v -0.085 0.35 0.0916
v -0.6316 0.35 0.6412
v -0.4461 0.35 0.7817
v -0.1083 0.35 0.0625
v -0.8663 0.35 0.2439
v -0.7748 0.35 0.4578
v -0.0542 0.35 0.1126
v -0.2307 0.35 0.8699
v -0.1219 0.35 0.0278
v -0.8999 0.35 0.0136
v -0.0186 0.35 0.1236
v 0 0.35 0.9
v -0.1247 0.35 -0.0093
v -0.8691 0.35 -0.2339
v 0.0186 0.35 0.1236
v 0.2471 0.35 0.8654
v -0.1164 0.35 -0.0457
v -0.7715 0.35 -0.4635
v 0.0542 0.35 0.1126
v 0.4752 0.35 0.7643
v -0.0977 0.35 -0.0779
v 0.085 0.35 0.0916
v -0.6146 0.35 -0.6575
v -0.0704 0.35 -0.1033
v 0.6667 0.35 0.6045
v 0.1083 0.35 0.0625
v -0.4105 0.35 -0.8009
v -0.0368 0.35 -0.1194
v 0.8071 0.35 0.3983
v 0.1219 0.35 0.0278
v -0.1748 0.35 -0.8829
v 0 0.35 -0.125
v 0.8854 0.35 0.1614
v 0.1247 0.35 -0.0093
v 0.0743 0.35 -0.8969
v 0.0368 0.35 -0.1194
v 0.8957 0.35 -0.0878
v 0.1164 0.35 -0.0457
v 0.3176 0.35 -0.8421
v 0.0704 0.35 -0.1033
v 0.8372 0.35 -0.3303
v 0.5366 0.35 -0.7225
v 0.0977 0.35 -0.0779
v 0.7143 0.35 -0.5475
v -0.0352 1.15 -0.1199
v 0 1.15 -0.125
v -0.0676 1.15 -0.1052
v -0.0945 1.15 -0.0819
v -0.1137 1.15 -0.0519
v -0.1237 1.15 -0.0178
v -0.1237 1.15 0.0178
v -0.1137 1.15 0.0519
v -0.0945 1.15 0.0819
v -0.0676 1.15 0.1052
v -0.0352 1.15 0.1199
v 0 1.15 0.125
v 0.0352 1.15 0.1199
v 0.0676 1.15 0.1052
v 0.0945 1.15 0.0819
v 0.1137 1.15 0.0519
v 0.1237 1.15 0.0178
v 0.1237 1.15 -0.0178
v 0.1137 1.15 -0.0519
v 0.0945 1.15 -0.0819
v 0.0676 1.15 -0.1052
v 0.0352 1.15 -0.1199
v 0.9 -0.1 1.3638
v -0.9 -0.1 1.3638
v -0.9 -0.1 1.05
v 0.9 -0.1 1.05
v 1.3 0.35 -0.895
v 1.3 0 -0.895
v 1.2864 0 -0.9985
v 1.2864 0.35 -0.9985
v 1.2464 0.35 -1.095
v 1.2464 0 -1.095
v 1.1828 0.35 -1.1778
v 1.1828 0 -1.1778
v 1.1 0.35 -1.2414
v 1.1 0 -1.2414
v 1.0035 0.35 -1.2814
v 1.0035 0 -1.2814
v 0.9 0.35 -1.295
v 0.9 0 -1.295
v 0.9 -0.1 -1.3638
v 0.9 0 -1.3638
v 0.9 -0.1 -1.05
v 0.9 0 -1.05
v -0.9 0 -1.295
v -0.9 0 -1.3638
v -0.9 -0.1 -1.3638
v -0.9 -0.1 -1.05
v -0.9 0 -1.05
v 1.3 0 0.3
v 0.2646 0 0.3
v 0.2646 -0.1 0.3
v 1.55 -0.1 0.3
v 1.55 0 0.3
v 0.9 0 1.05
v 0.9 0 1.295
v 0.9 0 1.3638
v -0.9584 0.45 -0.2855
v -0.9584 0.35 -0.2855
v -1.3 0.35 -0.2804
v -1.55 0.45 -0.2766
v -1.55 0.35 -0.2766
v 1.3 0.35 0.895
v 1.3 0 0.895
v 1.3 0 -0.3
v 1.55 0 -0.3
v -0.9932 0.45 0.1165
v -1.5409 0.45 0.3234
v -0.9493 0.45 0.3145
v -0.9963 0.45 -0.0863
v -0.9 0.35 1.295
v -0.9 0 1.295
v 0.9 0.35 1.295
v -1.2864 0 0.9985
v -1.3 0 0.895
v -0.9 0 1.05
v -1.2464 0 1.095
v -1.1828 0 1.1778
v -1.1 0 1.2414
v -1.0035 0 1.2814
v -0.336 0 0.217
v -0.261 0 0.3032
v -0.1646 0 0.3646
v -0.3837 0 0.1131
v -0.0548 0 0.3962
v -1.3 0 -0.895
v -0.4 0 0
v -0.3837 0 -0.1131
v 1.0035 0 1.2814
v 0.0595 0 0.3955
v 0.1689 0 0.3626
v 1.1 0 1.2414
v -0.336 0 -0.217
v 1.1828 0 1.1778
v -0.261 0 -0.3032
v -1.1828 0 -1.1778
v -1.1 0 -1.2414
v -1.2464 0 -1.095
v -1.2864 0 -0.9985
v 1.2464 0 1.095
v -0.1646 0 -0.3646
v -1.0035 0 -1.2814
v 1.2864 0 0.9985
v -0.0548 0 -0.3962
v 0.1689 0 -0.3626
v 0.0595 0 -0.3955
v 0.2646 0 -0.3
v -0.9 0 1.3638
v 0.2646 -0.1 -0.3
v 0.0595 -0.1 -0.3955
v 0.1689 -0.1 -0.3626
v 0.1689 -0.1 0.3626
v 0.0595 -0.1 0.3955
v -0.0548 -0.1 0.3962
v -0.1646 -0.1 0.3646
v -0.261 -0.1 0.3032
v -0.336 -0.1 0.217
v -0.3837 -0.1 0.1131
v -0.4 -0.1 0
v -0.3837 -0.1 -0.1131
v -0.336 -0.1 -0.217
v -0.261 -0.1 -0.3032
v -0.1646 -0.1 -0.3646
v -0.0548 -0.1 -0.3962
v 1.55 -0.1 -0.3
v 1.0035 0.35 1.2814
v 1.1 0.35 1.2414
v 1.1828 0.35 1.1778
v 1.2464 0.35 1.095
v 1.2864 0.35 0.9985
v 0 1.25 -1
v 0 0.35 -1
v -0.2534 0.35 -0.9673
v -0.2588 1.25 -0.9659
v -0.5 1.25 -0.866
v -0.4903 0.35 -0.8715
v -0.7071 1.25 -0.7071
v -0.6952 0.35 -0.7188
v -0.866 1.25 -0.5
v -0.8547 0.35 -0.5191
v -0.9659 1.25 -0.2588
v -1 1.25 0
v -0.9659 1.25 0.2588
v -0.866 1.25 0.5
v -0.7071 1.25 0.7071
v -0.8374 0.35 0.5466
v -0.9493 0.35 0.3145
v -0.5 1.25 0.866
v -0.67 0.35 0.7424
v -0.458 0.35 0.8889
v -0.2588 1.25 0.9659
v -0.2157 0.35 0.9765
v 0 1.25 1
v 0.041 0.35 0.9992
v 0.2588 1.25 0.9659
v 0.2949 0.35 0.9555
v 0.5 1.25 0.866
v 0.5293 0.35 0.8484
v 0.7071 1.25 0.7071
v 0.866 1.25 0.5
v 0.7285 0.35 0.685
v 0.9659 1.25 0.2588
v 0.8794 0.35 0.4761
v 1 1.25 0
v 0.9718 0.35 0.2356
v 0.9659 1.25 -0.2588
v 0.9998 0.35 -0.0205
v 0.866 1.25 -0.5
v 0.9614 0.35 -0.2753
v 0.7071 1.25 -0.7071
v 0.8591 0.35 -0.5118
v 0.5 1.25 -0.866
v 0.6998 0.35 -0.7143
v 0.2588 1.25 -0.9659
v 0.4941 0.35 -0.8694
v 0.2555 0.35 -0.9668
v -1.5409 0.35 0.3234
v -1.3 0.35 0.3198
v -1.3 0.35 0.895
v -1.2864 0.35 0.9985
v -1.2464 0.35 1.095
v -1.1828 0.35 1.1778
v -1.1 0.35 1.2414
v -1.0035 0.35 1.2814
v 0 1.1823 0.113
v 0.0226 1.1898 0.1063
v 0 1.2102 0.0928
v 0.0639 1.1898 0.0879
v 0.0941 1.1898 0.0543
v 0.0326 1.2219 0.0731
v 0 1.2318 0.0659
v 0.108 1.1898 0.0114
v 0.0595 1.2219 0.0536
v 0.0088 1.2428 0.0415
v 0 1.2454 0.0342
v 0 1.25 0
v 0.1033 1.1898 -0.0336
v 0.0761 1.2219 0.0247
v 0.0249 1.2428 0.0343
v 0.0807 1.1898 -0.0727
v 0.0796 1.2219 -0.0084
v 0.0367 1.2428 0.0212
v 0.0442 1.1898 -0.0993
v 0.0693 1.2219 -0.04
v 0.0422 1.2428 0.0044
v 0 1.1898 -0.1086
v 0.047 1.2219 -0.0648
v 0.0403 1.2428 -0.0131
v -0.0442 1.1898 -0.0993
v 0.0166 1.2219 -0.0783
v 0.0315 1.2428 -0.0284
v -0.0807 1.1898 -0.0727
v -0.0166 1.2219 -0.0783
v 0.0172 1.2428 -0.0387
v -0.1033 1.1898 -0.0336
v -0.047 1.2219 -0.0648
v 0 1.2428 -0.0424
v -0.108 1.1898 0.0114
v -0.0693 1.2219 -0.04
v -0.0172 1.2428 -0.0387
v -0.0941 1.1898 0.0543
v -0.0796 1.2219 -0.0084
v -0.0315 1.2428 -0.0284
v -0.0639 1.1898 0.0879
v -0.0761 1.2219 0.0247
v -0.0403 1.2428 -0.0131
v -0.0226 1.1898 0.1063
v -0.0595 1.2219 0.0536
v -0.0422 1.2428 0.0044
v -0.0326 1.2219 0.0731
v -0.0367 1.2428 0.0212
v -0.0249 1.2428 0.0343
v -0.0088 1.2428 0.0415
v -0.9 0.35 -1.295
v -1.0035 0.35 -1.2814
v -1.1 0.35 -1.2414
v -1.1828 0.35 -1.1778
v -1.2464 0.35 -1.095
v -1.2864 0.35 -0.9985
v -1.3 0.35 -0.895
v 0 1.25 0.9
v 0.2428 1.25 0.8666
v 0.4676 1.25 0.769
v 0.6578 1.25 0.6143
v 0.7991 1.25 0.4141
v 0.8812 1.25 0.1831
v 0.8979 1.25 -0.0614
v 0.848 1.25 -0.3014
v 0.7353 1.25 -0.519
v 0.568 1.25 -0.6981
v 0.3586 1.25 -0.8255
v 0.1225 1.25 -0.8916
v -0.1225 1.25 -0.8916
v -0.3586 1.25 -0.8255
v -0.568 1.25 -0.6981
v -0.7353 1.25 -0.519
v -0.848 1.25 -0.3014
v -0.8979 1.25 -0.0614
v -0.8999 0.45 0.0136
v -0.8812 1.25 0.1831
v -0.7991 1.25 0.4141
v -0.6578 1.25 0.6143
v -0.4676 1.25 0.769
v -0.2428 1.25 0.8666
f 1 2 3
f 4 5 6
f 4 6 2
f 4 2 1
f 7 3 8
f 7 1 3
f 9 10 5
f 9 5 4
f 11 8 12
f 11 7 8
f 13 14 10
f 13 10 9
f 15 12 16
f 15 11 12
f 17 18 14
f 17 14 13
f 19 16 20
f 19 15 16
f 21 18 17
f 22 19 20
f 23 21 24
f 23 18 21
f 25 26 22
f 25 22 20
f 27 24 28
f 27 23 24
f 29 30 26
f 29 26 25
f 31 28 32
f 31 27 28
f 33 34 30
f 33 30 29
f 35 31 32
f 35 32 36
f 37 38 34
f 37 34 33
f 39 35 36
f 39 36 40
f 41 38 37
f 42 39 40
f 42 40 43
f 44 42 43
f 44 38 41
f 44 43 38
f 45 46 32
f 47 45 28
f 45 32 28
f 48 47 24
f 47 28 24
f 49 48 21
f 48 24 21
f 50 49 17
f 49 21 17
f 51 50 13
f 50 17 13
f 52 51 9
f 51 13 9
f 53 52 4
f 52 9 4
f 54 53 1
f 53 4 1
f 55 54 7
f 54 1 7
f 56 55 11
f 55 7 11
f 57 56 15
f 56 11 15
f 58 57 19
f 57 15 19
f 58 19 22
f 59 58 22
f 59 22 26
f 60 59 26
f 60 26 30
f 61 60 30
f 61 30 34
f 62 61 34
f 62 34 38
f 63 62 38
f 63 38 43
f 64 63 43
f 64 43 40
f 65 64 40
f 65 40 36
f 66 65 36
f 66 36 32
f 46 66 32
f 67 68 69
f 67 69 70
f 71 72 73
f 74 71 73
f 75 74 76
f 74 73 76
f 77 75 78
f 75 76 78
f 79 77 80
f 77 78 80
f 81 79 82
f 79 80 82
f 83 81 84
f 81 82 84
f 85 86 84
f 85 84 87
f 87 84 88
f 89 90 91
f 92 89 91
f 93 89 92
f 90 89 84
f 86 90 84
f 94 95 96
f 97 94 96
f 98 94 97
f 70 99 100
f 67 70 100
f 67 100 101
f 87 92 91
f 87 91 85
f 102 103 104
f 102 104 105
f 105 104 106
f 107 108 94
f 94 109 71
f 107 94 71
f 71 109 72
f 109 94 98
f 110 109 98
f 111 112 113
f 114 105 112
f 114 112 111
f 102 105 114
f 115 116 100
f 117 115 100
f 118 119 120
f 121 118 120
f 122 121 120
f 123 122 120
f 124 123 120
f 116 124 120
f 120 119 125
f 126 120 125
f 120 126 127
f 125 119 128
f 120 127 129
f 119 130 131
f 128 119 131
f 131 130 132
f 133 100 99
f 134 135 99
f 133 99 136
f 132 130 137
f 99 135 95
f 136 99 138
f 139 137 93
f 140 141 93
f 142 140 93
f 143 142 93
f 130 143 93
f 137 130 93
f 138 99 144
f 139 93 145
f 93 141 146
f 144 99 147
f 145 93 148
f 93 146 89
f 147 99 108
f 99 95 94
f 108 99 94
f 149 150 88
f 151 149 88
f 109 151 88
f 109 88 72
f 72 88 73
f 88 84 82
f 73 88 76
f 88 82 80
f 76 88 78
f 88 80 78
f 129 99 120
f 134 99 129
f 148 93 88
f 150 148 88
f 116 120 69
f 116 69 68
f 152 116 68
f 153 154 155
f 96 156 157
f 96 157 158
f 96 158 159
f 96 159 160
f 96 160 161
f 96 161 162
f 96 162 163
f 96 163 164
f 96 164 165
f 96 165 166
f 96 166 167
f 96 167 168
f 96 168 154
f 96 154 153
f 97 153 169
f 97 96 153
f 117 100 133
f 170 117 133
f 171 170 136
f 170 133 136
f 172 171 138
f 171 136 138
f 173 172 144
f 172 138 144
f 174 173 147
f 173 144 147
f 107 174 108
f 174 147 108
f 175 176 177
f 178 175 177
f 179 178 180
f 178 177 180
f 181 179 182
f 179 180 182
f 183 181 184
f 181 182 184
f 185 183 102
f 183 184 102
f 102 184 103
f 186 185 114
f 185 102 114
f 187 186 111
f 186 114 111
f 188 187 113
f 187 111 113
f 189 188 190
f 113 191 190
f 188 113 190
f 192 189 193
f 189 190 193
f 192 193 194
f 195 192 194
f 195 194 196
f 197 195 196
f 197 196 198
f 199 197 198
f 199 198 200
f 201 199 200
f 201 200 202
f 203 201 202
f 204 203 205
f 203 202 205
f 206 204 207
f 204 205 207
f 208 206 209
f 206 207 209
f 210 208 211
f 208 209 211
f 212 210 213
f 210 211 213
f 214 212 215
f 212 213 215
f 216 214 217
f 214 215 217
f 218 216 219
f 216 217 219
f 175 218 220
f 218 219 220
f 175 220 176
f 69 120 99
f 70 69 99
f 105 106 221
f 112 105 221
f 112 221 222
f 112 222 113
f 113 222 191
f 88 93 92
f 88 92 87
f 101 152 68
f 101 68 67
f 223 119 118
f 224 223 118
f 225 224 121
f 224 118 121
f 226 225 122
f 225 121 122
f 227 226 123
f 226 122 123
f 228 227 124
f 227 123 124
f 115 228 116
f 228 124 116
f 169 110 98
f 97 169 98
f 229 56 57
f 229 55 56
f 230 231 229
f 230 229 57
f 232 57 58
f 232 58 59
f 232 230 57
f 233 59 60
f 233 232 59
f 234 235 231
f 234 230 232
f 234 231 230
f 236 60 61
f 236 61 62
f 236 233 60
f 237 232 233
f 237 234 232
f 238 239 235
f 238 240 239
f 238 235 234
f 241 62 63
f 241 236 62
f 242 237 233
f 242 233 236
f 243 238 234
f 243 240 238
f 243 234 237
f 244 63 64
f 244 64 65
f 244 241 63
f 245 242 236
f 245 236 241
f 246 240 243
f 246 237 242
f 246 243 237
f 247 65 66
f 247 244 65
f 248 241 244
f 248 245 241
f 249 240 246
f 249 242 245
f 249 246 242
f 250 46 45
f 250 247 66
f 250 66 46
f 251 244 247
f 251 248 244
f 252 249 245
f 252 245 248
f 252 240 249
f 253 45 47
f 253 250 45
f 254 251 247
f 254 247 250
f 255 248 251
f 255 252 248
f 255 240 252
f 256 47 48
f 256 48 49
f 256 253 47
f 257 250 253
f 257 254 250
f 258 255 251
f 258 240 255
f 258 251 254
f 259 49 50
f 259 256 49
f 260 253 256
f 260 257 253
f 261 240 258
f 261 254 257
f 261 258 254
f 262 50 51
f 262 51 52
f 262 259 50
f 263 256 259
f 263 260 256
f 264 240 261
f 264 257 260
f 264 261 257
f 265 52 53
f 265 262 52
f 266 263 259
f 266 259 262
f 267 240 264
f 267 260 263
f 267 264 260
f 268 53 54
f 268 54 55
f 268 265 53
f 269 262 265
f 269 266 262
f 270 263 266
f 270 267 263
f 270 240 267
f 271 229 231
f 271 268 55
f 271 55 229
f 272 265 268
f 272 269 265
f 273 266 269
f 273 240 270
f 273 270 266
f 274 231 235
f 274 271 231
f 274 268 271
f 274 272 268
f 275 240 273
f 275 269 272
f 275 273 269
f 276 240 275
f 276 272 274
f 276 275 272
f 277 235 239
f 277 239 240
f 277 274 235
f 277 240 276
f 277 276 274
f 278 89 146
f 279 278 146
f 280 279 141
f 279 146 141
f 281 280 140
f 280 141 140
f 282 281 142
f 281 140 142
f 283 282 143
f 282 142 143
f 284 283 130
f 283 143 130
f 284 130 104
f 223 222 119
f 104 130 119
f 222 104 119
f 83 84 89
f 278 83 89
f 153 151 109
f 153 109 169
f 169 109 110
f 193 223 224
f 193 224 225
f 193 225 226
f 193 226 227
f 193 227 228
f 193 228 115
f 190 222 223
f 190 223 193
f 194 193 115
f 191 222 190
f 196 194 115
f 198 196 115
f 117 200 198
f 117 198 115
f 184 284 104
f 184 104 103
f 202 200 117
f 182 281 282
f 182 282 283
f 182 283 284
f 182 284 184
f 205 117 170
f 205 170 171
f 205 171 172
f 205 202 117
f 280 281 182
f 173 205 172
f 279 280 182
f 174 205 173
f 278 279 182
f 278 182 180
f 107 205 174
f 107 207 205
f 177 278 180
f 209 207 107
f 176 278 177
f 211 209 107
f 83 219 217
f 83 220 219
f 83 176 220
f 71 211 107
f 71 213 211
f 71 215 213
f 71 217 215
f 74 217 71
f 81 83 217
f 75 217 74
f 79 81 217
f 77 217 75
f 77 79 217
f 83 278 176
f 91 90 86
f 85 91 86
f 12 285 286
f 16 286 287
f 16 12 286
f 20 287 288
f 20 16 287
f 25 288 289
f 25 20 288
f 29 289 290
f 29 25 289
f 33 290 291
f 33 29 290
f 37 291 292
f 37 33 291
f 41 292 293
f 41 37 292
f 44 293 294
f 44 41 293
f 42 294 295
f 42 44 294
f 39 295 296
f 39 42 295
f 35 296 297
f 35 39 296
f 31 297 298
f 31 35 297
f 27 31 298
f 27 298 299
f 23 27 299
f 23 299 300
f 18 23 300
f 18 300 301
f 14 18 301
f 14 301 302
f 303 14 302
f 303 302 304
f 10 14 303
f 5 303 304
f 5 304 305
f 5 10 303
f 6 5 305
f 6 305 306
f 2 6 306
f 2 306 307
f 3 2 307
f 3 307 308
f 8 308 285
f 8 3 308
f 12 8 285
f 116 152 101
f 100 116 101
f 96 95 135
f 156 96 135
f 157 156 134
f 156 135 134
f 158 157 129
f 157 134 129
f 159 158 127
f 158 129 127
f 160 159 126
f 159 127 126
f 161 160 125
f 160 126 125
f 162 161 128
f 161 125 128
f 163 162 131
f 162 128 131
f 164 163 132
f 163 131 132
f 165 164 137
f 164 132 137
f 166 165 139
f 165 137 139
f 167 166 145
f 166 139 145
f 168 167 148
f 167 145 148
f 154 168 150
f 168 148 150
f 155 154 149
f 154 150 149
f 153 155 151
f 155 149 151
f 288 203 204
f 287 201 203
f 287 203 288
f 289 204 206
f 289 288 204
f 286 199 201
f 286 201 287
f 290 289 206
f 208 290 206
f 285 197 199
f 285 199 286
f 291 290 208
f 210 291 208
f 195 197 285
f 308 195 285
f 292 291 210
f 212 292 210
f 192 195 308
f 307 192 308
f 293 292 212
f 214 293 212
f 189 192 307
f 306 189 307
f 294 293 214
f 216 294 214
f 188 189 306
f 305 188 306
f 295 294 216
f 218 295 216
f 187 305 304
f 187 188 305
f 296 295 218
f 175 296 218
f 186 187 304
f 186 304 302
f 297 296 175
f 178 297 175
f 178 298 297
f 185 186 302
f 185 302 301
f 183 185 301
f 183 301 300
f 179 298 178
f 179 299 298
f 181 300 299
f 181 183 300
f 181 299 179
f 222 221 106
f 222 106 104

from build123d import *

# Parameters (mm, degrees)
BOSS_EXTRUDE2_DEPTH = 0.35
SKETCH2_R           = 1
SKETCH2_R_2         = 0.9
BOSS_EXTRUDE3_DEPTH = 0.9
SKETCH3_R           = 0.125
BOSS_EXTRUDE4_DEPTH = 0.8
DOME1_FACE_RADIUS   = 0.125
DOME1_HEIGHT        = 0.1
SKETCH4_W           = 1.8
SKETCH4_H           = 0.313763297
BOSS_EXTRUDE5_DEPTH = 0.1
SKETCH5_R           = 0.4
SKETCH5_W           = 1.55
SKETCH5_H           = 0.6
BOSS_EXTRUDE6_DEPTH = 0.1
BOSS_EXTRUDE7_DEPTH = 0.1


with BuildPart() as part:
    # Sketch1 → Boss-Extrude2 (new body)
    with BuildSketch(Plane(origin=(0, 0, 0), x_dir=(1, 0, 0), z_dir=(0, 1, 0))):
        with BuildLine():
            Line((-0.9, -1.295), (0.9, -1.295))
            ThreePointArc((0.9, -1.295), (1.182842712, -1.177842712), (1.3, -0.895))
            Line((1.3, -0.895), (1.3, 0.895))
            ThreePointArc((1.3, 0.895), (1.182842712, 1.177842712), (0.9, 1.295))
            Line((0.9, 1.295), (-0.9, 1.295))
            ThreePointArc((-0.9, 1.295), (-1.182842712, 1.177842712), (-1.3, 0.895))
            Line((-1.3, 0.895), (-1.3, -0.895))
            ThreePointArc((-1.3, -0.895), (-1.182842712, -1.177842712), (-0.9, -1.295))
        make_face()
    extrude(amount=BOSS_EXTRUDE2_DEPTH)

    # Sketch2 → Boss-Extrude3 (add)
    with BuildSketch(Plane(origin=(0, 0.35, 0), x_dir=(-1, 0, 0), z_dir=(0, 1, 0))):
        with Locations(Location((0, 0, 0), (0, 0, 270))):
            Circle(SKETCH2_R)
        with Locations(Location((0, 0, 0), (0, 0, 90))):
            Circle(SKETCH2_R_2, mode=Mode.SUBTRACT)
    extrude(amount=BOSS_EXTRUDE3_DEPTH)

    # Sketch3 → Boss-Extrude4 (add)
    with BuildSketch(Plane(origin=(0, 0.35, 0), x_dir=(-1, 0, 0), z_dir=(0, 1, 0))):
        with Locations(Location((0, 0, 0), (0, 0, 270))):
            Circle(SKETCH3_R)
    extrude(amount=BOSS_EXTRUDE4_DEPTH)

    # Dome1: a dome of height H over a round flat face of radius A is a cap of a sphere of radius (A * A + H * H) / (2 * H)
    dome1_r = (DOME1_FACE_RADIUS * DOME1_FACE_RADIUS + DOME1_HEIGHT * DOME1_HEIGHT) / (2 * DOME1_HEIGHT)
    dome1_base = Plane((0, 1.15, 0), z_dir=(0, 1, 0))
    with Locations(dome1_base.offset(DOME1_HEIGHT - dome1_r)):
        dome1_ball = Sphere(dome1_r, mode=Mode.PRIVATE)
    add(split(dome1_ball, bisect_by=dome1_base, keep=Keep.TOP, mode=Mode.PRIVATE))

    # Sketch4 → Boss-Extrude5 (add)
    with BuildSketch(Plane.XZ):
        with Locations((0, 1.206881649)):
            Rectangle(SKETCH4_W, SKETCH4_H)
        with Locations((0, -1.206881649)):
            Rectangle(SKETCH4_W, SKETCH4_H)
    extrude(amount=BOSS_EXTRUDE5_DEPTH)

    # Sketch5 → Boss-Extrude6 (add)
    with BuildSketch(Plane.XZ):
        Circle(SKETCH5_R)
        with Locations((0.775, 0)):
            Rectangle(SKETCH5_W, SKETCH5_H)
    extrude(amount=BOSS_EXTRUDE6_DEPTH)

    # Sketch6 → Boss-Extrude7 (add)
    with BuildSketch(Plane(origin=(0, 0.35, 0), x_dir=(1, 0, 0), z_dir=(0, 1, 0))):
        Polygon((-0.89535182, -0.313633184), (-0.904441652, 0.286366816), (-1.55, 0.276586788), (-1.540910168, -0.323413212), align=None)
    extrude(amount=BOSS_EXTRUDE7_DEPTH)


solid = part.part
